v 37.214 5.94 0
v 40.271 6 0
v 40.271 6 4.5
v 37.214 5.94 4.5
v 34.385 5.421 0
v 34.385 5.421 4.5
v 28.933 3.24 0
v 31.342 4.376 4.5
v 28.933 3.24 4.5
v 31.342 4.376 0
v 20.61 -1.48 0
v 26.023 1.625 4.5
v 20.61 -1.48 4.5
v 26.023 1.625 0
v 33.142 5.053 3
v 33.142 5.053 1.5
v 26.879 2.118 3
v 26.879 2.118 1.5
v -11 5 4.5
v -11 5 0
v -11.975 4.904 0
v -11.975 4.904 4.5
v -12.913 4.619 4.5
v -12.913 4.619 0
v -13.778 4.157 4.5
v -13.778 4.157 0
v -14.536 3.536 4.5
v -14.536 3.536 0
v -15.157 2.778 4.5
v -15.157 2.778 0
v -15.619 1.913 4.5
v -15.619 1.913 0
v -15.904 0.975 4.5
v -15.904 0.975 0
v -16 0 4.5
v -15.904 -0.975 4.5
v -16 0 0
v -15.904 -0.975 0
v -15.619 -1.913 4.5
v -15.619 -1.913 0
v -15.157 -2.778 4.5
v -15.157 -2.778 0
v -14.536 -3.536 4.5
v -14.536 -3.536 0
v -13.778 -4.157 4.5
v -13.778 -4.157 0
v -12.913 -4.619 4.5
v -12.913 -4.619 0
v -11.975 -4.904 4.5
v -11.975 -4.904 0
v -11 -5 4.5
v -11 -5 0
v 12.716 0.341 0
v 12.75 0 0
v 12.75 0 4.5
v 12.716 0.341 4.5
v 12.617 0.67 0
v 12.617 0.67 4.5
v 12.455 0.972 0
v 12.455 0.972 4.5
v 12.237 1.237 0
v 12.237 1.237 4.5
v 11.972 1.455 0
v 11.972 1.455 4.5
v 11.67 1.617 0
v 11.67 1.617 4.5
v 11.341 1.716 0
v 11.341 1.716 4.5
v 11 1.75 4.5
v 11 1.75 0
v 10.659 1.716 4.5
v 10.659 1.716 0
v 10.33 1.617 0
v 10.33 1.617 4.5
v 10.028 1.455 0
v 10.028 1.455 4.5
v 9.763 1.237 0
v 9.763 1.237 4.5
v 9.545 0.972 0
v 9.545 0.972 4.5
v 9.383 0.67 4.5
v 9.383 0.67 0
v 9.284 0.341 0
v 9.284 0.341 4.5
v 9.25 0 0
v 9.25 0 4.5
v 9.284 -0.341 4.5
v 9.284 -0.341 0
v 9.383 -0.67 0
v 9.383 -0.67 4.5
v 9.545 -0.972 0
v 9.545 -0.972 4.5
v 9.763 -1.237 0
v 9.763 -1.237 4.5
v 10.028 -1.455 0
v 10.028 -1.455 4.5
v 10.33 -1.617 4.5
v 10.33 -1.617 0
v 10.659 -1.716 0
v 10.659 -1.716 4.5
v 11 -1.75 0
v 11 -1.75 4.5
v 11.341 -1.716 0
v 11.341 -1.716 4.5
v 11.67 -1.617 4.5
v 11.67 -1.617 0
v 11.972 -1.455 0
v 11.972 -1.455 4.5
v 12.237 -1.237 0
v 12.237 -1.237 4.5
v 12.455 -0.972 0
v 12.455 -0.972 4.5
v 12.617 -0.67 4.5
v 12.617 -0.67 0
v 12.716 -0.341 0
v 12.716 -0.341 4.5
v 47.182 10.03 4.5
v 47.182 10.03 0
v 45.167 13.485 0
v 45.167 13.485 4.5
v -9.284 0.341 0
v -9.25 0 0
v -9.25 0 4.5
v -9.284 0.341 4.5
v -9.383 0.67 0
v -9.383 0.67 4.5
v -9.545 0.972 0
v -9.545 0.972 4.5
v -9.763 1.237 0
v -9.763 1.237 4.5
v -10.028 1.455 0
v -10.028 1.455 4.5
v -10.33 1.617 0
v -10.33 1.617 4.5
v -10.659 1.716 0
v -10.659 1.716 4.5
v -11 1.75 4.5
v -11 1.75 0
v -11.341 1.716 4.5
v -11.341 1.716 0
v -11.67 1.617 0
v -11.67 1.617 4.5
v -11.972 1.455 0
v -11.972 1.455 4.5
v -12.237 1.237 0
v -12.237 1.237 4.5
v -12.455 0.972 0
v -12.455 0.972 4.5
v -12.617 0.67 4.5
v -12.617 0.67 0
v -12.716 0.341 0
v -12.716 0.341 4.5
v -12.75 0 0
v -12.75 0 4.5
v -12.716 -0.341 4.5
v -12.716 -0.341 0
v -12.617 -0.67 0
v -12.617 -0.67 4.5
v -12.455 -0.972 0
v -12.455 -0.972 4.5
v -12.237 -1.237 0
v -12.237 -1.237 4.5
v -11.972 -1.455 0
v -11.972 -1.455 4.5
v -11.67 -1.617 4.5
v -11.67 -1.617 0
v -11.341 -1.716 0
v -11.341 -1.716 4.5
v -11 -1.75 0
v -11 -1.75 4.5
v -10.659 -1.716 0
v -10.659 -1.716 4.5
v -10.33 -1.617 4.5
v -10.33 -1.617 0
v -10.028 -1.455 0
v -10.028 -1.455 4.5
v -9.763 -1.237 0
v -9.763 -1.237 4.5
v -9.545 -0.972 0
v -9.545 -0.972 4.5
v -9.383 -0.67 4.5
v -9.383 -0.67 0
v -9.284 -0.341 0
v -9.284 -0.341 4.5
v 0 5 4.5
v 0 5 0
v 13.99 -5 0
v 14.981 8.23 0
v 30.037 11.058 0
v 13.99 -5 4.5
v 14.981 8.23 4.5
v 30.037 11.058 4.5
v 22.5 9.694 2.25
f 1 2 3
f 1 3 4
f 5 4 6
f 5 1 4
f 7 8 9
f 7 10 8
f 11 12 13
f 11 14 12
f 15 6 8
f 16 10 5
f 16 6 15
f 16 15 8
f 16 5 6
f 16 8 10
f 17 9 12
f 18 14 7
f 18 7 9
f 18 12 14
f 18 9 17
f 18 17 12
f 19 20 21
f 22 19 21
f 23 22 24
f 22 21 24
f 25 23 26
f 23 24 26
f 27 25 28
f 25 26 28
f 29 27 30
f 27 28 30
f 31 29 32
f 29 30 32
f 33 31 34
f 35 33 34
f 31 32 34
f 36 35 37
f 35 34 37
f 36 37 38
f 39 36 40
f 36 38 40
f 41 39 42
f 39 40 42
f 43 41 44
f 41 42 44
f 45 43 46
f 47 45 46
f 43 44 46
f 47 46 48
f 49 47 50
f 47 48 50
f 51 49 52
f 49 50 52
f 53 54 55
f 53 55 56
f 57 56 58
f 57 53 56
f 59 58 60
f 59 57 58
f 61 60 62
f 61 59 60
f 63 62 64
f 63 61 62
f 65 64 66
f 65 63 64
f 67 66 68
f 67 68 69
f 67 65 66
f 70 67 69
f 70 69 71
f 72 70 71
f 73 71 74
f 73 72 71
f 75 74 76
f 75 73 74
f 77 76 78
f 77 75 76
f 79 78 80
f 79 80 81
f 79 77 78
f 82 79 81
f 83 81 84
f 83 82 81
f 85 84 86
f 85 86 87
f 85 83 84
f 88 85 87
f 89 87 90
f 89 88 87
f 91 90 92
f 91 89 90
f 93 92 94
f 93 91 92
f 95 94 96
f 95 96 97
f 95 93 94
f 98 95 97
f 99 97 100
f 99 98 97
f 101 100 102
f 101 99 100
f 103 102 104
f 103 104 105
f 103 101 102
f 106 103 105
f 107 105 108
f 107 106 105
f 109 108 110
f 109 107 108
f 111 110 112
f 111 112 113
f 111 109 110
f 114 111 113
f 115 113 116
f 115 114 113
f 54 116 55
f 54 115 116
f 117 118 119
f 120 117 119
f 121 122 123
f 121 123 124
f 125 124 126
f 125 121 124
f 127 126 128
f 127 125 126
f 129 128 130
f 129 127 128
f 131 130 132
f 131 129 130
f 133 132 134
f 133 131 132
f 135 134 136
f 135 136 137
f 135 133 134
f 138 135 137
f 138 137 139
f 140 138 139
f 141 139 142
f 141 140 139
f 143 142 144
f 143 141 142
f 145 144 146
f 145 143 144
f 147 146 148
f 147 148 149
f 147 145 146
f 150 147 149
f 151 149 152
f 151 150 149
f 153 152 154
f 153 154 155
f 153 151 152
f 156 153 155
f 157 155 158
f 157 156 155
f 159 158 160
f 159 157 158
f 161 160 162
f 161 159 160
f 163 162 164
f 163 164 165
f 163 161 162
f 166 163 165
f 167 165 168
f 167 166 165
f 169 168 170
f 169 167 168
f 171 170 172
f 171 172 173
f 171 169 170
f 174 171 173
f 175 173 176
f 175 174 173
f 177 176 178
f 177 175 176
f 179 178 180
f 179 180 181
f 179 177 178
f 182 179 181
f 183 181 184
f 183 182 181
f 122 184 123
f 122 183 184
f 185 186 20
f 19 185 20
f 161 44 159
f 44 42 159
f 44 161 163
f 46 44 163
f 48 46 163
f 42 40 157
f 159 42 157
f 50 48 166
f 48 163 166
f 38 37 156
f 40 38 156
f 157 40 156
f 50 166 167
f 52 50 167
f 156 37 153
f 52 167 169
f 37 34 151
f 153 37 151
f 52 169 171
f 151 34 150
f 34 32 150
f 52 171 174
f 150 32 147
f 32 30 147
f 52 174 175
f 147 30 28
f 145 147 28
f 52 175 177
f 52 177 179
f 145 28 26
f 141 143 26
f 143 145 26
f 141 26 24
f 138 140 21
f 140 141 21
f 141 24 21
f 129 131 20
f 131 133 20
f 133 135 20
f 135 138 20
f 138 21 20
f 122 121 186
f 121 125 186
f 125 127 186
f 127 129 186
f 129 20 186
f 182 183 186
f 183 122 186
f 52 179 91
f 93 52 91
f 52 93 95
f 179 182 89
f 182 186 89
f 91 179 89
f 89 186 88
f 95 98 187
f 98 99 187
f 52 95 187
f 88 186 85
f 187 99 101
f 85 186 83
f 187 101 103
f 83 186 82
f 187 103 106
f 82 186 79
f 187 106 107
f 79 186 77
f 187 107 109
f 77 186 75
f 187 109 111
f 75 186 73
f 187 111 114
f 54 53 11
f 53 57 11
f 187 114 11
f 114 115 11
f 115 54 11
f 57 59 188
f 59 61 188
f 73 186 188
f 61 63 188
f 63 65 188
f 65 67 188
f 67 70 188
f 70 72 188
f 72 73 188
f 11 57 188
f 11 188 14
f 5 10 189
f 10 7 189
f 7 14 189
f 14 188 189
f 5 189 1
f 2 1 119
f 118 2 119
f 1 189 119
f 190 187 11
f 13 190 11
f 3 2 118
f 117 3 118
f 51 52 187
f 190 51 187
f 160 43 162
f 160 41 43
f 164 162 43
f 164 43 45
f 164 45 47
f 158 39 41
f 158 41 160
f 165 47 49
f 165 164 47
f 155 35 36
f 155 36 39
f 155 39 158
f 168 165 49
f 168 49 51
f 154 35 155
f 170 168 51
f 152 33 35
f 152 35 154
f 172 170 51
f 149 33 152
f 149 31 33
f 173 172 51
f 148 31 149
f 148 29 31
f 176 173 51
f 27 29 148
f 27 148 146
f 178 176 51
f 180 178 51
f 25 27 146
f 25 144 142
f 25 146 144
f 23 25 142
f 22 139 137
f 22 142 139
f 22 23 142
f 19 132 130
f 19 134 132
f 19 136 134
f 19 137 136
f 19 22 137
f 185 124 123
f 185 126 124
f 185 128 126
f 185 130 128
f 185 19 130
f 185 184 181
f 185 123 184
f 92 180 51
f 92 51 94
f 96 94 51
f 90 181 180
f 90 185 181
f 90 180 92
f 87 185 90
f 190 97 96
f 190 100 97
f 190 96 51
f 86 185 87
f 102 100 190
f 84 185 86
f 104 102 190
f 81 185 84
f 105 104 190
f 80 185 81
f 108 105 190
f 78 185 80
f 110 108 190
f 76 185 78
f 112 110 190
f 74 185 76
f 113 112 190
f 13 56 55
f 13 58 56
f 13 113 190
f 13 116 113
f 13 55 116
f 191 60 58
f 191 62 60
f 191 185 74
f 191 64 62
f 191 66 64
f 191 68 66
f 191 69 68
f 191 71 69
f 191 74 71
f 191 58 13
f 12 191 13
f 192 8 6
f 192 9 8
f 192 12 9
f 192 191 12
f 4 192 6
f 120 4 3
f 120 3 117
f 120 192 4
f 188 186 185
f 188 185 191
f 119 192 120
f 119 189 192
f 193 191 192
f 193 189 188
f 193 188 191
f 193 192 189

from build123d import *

# Parameters (mm, degrees)
SKETCH1_R           = 1.75
BOSS_EXTRUDE1_DEPTH = 4.5
BOSS_EXTRUDE2_START = -4.5
BOSS_EXTRUDE2_DEPTH = 4.5


with BuildPart() as part:
    # Sketch1 → Boss-Extrude1 (new body)
    with BuildSketch(Plane.XY):
        with BuildLine():
            ThreePointArc((-11, 5), (-16, 0), (-11, -5))
            Line((-11, -5), (11.000000019, -5))
            ThreePointArc((11.000000019, -5), (16, 9e-09), (11, 5))
            Line((11, 5), (-11, 5))
        make_face()
        with Locations((-11, 0)):
            Circle(SKETCH1_R, mode=Mode.SUBTRACT)
        with Locations((11, 0)):
            Circle(SKETCH1_R, mode=Mode.SUBTRACT)
    extrude(amount=BOSS_EXTRUDE1_DEPTH)

    # Sketch2 → Boss-Extrude2 (add)
    with BuildSketch(Plane.XY.offset(4.5).offset(BOSS_EXTRUDE2_START)):
        with BuildLine():
            Line((47.182162457, 10.03), (45.167162457, 13.485397951))
            add(Edge.make_bspline(
                [(0, 5), (22.415618243, 10.14564432), (45.167162457, 13.485397951)],
                knots=[0, 0, 0, 1, 1, 1], degree=2))
            Line((0, 5), (11, 5))
            ThreePointArc((11, 5), (16, 0), (11, -5))
            Line((11, -5), (13.99, -5))
            Line((13.99, -5), (20.61, -1.48))
            add(Edge.make_bspline(
                [(40.271366555, 6), (32.419293016, 6.4877302), (27.171947838, 2.009132385), (20.61, -1.48)],
                knots=[0, 0, 0, 0, 1, 1, 1, 1], degree=3))
            Line((40.271366555, 6), (47.182162457, 10.03))
        make_face()
    extrude(amount=BOSS_EXTRUDE2_DEPTH)


solid = part.part
